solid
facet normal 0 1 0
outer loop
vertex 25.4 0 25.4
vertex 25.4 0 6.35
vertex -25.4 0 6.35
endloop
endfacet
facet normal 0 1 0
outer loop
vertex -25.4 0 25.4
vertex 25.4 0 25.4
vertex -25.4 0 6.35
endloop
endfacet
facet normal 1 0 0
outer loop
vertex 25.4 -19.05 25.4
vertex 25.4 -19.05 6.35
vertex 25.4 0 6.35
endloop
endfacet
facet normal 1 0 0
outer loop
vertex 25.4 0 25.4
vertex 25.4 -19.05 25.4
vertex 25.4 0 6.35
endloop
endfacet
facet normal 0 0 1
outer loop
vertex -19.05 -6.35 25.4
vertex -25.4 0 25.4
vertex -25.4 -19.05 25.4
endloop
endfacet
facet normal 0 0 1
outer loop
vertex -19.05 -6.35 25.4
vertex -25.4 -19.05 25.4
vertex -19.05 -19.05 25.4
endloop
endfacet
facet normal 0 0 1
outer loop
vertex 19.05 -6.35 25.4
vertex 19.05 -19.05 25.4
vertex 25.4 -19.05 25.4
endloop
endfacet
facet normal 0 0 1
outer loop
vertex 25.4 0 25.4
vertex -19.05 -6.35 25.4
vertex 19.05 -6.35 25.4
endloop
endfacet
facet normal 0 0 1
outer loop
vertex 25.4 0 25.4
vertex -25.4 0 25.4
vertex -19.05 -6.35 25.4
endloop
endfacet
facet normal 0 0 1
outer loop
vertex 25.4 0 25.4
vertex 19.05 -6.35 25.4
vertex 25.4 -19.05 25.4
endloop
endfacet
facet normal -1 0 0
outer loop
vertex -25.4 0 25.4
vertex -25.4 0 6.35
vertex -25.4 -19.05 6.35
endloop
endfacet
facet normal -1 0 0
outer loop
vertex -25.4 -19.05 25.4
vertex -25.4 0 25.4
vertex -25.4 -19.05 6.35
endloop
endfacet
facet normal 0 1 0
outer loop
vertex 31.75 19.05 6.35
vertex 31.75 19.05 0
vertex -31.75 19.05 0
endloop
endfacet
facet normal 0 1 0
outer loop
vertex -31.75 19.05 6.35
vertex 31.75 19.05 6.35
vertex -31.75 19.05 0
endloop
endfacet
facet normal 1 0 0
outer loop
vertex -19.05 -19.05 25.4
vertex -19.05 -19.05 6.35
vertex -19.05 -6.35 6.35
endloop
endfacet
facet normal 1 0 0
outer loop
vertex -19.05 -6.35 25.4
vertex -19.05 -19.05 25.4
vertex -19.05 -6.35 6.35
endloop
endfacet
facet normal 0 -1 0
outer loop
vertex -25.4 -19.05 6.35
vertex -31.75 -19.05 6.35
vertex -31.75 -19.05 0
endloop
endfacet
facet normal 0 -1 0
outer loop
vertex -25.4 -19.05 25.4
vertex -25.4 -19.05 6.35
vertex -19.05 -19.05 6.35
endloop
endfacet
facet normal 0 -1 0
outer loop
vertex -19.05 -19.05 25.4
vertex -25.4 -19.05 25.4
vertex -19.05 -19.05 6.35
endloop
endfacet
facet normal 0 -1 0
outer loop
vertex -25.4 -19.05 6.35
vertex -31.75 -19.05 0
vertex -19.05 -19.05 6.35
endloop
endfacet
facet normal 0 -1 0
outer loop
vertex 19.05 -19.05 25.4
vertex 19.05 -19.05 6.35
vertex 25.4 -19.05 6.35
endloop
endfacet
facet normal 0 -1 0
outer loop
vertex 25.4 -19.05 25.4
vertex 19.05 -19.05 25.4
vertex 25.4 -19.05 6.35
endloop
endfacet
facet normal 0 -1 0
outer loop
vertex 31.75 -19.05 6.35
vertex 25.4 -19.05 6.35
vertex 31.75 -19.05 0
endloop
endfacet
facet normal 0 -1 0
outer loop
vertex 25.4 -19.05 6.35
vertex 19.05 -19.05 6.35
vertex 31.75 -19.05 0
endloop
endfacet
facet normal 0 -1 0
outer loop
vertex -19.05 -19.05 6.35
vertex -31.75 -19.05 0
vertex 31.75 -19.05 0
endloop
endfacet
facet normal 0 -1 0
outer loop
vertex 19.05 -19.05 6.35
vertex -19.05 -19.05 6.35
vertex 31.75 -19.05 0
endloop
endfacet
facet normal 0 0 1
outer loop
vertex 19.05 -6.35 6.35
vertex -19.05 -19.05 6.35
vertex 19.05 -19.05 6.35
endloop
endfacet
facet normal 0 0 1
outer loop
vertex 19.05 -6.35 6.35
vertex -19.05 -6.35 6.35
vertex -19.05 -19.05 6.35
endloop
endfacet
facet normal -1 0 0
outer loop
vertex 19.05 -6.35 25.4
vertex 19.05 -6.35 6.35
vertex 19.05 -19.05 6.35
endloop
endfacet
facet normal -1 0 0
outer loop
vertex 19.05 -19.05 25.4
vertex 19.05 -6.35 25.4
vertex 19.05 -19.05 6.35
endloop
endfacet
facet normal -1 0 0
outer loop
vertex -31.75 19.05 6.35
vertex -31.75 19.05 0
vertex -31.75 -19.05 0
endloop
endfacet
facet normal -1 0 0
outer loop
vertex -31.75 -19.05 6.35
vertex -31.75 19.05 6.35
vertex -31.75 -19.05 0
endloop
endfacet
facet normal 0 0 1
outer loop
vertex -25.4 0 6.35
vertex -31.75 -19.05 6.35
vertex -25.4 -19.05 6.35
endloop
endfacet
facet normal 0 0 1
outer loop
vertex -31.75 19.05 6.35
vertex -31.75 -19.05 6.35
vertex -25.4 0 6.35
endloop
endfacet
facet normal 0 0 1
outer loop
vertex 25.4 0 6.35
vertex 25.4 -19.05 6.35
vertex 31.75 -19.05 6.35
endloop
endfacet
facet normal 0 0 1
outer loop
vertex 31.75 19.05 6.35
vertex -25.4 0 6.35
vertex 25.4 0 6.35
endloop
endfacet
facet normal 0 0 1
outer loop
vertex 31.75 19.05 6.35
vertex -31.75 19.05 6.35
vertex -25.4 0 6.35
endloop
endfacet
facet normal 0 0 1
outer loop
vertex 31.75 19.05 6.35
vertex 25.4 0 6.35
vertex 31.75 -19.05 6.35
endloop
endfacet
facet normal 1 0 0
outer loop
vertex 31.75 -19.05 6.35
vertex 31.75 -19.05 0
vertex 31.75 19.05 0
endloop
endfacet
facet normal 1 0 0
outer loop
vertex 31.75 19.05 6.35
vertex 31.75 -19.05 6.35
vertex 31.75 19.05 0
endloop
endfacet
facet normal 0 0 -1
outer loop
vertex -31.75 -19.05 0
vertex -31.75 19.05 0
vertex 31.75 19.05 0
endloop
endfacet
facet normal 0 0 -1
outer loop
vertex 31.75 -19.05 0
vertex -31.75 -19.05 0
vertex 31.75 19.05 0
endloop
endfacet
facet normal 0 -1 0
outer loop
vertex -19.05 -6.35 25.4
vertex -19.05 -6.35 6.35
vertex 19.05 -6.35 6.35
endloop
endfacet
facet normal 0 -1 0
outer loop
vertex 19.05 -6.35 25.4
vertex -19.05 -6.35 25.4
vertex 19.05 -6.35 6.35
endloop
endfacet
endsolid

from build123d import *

# Parameters (mm, degrees)
F0_W     = 6.35
F0_H     = 12.7
F0_H_2   = 6.35
F0_W_2   = 38.1
F1_DEPTH = 25.4
F2_DEPTH = 6.35


with BuildPart() as f1:
    # F0 (on Top) → F1 (new body)
    with BuildSketch(Plane.XY):
        with Locations((22.225, -12.7)):
            Rectangle(F0_W, F0_H)
        with Locations((22.225, -3.175)):
            Rectangle(F0_W, F0_H_2)
        with Locations((0, -3.175)):
            Rectangle(F0_W_2, F0_H_2)
        with Locations((-22.225, -3.175)):
            Rectangle(F0_W, F0_H_2)
        with Locations((-22.225, -12.7)):
            Rectangle(F0_W, F0_H)
    extrude(amount=F1_DEPTH)

    # F0 (on Top) → F2 (join)
    with BuildSketch(Plane.XY):
        Polygon((31.75, 19.05), (-31.75, 19.05), (-31.75, -19.05), (-25.4, -19.05), (-25.4, -6.35), (-25.4, 0), (-19.05, 0), (19.05, 0), (25.4, 0), (25.4, -6.35), (25.4, -19.05), (31.75, -19.05), align=None)
        with Locations((-22.225, -12.7)):
            Rectangle(F0_W, F0_H)
        with Locations((22.225, -12.7)):
            Rectangle(F0_W, F0_H)
        with Locations((0, -12.7)):
            Rectangle(F0_W_2, F0_H)
    extrude(amount=F2_DEPTH)


solid = f1.part
